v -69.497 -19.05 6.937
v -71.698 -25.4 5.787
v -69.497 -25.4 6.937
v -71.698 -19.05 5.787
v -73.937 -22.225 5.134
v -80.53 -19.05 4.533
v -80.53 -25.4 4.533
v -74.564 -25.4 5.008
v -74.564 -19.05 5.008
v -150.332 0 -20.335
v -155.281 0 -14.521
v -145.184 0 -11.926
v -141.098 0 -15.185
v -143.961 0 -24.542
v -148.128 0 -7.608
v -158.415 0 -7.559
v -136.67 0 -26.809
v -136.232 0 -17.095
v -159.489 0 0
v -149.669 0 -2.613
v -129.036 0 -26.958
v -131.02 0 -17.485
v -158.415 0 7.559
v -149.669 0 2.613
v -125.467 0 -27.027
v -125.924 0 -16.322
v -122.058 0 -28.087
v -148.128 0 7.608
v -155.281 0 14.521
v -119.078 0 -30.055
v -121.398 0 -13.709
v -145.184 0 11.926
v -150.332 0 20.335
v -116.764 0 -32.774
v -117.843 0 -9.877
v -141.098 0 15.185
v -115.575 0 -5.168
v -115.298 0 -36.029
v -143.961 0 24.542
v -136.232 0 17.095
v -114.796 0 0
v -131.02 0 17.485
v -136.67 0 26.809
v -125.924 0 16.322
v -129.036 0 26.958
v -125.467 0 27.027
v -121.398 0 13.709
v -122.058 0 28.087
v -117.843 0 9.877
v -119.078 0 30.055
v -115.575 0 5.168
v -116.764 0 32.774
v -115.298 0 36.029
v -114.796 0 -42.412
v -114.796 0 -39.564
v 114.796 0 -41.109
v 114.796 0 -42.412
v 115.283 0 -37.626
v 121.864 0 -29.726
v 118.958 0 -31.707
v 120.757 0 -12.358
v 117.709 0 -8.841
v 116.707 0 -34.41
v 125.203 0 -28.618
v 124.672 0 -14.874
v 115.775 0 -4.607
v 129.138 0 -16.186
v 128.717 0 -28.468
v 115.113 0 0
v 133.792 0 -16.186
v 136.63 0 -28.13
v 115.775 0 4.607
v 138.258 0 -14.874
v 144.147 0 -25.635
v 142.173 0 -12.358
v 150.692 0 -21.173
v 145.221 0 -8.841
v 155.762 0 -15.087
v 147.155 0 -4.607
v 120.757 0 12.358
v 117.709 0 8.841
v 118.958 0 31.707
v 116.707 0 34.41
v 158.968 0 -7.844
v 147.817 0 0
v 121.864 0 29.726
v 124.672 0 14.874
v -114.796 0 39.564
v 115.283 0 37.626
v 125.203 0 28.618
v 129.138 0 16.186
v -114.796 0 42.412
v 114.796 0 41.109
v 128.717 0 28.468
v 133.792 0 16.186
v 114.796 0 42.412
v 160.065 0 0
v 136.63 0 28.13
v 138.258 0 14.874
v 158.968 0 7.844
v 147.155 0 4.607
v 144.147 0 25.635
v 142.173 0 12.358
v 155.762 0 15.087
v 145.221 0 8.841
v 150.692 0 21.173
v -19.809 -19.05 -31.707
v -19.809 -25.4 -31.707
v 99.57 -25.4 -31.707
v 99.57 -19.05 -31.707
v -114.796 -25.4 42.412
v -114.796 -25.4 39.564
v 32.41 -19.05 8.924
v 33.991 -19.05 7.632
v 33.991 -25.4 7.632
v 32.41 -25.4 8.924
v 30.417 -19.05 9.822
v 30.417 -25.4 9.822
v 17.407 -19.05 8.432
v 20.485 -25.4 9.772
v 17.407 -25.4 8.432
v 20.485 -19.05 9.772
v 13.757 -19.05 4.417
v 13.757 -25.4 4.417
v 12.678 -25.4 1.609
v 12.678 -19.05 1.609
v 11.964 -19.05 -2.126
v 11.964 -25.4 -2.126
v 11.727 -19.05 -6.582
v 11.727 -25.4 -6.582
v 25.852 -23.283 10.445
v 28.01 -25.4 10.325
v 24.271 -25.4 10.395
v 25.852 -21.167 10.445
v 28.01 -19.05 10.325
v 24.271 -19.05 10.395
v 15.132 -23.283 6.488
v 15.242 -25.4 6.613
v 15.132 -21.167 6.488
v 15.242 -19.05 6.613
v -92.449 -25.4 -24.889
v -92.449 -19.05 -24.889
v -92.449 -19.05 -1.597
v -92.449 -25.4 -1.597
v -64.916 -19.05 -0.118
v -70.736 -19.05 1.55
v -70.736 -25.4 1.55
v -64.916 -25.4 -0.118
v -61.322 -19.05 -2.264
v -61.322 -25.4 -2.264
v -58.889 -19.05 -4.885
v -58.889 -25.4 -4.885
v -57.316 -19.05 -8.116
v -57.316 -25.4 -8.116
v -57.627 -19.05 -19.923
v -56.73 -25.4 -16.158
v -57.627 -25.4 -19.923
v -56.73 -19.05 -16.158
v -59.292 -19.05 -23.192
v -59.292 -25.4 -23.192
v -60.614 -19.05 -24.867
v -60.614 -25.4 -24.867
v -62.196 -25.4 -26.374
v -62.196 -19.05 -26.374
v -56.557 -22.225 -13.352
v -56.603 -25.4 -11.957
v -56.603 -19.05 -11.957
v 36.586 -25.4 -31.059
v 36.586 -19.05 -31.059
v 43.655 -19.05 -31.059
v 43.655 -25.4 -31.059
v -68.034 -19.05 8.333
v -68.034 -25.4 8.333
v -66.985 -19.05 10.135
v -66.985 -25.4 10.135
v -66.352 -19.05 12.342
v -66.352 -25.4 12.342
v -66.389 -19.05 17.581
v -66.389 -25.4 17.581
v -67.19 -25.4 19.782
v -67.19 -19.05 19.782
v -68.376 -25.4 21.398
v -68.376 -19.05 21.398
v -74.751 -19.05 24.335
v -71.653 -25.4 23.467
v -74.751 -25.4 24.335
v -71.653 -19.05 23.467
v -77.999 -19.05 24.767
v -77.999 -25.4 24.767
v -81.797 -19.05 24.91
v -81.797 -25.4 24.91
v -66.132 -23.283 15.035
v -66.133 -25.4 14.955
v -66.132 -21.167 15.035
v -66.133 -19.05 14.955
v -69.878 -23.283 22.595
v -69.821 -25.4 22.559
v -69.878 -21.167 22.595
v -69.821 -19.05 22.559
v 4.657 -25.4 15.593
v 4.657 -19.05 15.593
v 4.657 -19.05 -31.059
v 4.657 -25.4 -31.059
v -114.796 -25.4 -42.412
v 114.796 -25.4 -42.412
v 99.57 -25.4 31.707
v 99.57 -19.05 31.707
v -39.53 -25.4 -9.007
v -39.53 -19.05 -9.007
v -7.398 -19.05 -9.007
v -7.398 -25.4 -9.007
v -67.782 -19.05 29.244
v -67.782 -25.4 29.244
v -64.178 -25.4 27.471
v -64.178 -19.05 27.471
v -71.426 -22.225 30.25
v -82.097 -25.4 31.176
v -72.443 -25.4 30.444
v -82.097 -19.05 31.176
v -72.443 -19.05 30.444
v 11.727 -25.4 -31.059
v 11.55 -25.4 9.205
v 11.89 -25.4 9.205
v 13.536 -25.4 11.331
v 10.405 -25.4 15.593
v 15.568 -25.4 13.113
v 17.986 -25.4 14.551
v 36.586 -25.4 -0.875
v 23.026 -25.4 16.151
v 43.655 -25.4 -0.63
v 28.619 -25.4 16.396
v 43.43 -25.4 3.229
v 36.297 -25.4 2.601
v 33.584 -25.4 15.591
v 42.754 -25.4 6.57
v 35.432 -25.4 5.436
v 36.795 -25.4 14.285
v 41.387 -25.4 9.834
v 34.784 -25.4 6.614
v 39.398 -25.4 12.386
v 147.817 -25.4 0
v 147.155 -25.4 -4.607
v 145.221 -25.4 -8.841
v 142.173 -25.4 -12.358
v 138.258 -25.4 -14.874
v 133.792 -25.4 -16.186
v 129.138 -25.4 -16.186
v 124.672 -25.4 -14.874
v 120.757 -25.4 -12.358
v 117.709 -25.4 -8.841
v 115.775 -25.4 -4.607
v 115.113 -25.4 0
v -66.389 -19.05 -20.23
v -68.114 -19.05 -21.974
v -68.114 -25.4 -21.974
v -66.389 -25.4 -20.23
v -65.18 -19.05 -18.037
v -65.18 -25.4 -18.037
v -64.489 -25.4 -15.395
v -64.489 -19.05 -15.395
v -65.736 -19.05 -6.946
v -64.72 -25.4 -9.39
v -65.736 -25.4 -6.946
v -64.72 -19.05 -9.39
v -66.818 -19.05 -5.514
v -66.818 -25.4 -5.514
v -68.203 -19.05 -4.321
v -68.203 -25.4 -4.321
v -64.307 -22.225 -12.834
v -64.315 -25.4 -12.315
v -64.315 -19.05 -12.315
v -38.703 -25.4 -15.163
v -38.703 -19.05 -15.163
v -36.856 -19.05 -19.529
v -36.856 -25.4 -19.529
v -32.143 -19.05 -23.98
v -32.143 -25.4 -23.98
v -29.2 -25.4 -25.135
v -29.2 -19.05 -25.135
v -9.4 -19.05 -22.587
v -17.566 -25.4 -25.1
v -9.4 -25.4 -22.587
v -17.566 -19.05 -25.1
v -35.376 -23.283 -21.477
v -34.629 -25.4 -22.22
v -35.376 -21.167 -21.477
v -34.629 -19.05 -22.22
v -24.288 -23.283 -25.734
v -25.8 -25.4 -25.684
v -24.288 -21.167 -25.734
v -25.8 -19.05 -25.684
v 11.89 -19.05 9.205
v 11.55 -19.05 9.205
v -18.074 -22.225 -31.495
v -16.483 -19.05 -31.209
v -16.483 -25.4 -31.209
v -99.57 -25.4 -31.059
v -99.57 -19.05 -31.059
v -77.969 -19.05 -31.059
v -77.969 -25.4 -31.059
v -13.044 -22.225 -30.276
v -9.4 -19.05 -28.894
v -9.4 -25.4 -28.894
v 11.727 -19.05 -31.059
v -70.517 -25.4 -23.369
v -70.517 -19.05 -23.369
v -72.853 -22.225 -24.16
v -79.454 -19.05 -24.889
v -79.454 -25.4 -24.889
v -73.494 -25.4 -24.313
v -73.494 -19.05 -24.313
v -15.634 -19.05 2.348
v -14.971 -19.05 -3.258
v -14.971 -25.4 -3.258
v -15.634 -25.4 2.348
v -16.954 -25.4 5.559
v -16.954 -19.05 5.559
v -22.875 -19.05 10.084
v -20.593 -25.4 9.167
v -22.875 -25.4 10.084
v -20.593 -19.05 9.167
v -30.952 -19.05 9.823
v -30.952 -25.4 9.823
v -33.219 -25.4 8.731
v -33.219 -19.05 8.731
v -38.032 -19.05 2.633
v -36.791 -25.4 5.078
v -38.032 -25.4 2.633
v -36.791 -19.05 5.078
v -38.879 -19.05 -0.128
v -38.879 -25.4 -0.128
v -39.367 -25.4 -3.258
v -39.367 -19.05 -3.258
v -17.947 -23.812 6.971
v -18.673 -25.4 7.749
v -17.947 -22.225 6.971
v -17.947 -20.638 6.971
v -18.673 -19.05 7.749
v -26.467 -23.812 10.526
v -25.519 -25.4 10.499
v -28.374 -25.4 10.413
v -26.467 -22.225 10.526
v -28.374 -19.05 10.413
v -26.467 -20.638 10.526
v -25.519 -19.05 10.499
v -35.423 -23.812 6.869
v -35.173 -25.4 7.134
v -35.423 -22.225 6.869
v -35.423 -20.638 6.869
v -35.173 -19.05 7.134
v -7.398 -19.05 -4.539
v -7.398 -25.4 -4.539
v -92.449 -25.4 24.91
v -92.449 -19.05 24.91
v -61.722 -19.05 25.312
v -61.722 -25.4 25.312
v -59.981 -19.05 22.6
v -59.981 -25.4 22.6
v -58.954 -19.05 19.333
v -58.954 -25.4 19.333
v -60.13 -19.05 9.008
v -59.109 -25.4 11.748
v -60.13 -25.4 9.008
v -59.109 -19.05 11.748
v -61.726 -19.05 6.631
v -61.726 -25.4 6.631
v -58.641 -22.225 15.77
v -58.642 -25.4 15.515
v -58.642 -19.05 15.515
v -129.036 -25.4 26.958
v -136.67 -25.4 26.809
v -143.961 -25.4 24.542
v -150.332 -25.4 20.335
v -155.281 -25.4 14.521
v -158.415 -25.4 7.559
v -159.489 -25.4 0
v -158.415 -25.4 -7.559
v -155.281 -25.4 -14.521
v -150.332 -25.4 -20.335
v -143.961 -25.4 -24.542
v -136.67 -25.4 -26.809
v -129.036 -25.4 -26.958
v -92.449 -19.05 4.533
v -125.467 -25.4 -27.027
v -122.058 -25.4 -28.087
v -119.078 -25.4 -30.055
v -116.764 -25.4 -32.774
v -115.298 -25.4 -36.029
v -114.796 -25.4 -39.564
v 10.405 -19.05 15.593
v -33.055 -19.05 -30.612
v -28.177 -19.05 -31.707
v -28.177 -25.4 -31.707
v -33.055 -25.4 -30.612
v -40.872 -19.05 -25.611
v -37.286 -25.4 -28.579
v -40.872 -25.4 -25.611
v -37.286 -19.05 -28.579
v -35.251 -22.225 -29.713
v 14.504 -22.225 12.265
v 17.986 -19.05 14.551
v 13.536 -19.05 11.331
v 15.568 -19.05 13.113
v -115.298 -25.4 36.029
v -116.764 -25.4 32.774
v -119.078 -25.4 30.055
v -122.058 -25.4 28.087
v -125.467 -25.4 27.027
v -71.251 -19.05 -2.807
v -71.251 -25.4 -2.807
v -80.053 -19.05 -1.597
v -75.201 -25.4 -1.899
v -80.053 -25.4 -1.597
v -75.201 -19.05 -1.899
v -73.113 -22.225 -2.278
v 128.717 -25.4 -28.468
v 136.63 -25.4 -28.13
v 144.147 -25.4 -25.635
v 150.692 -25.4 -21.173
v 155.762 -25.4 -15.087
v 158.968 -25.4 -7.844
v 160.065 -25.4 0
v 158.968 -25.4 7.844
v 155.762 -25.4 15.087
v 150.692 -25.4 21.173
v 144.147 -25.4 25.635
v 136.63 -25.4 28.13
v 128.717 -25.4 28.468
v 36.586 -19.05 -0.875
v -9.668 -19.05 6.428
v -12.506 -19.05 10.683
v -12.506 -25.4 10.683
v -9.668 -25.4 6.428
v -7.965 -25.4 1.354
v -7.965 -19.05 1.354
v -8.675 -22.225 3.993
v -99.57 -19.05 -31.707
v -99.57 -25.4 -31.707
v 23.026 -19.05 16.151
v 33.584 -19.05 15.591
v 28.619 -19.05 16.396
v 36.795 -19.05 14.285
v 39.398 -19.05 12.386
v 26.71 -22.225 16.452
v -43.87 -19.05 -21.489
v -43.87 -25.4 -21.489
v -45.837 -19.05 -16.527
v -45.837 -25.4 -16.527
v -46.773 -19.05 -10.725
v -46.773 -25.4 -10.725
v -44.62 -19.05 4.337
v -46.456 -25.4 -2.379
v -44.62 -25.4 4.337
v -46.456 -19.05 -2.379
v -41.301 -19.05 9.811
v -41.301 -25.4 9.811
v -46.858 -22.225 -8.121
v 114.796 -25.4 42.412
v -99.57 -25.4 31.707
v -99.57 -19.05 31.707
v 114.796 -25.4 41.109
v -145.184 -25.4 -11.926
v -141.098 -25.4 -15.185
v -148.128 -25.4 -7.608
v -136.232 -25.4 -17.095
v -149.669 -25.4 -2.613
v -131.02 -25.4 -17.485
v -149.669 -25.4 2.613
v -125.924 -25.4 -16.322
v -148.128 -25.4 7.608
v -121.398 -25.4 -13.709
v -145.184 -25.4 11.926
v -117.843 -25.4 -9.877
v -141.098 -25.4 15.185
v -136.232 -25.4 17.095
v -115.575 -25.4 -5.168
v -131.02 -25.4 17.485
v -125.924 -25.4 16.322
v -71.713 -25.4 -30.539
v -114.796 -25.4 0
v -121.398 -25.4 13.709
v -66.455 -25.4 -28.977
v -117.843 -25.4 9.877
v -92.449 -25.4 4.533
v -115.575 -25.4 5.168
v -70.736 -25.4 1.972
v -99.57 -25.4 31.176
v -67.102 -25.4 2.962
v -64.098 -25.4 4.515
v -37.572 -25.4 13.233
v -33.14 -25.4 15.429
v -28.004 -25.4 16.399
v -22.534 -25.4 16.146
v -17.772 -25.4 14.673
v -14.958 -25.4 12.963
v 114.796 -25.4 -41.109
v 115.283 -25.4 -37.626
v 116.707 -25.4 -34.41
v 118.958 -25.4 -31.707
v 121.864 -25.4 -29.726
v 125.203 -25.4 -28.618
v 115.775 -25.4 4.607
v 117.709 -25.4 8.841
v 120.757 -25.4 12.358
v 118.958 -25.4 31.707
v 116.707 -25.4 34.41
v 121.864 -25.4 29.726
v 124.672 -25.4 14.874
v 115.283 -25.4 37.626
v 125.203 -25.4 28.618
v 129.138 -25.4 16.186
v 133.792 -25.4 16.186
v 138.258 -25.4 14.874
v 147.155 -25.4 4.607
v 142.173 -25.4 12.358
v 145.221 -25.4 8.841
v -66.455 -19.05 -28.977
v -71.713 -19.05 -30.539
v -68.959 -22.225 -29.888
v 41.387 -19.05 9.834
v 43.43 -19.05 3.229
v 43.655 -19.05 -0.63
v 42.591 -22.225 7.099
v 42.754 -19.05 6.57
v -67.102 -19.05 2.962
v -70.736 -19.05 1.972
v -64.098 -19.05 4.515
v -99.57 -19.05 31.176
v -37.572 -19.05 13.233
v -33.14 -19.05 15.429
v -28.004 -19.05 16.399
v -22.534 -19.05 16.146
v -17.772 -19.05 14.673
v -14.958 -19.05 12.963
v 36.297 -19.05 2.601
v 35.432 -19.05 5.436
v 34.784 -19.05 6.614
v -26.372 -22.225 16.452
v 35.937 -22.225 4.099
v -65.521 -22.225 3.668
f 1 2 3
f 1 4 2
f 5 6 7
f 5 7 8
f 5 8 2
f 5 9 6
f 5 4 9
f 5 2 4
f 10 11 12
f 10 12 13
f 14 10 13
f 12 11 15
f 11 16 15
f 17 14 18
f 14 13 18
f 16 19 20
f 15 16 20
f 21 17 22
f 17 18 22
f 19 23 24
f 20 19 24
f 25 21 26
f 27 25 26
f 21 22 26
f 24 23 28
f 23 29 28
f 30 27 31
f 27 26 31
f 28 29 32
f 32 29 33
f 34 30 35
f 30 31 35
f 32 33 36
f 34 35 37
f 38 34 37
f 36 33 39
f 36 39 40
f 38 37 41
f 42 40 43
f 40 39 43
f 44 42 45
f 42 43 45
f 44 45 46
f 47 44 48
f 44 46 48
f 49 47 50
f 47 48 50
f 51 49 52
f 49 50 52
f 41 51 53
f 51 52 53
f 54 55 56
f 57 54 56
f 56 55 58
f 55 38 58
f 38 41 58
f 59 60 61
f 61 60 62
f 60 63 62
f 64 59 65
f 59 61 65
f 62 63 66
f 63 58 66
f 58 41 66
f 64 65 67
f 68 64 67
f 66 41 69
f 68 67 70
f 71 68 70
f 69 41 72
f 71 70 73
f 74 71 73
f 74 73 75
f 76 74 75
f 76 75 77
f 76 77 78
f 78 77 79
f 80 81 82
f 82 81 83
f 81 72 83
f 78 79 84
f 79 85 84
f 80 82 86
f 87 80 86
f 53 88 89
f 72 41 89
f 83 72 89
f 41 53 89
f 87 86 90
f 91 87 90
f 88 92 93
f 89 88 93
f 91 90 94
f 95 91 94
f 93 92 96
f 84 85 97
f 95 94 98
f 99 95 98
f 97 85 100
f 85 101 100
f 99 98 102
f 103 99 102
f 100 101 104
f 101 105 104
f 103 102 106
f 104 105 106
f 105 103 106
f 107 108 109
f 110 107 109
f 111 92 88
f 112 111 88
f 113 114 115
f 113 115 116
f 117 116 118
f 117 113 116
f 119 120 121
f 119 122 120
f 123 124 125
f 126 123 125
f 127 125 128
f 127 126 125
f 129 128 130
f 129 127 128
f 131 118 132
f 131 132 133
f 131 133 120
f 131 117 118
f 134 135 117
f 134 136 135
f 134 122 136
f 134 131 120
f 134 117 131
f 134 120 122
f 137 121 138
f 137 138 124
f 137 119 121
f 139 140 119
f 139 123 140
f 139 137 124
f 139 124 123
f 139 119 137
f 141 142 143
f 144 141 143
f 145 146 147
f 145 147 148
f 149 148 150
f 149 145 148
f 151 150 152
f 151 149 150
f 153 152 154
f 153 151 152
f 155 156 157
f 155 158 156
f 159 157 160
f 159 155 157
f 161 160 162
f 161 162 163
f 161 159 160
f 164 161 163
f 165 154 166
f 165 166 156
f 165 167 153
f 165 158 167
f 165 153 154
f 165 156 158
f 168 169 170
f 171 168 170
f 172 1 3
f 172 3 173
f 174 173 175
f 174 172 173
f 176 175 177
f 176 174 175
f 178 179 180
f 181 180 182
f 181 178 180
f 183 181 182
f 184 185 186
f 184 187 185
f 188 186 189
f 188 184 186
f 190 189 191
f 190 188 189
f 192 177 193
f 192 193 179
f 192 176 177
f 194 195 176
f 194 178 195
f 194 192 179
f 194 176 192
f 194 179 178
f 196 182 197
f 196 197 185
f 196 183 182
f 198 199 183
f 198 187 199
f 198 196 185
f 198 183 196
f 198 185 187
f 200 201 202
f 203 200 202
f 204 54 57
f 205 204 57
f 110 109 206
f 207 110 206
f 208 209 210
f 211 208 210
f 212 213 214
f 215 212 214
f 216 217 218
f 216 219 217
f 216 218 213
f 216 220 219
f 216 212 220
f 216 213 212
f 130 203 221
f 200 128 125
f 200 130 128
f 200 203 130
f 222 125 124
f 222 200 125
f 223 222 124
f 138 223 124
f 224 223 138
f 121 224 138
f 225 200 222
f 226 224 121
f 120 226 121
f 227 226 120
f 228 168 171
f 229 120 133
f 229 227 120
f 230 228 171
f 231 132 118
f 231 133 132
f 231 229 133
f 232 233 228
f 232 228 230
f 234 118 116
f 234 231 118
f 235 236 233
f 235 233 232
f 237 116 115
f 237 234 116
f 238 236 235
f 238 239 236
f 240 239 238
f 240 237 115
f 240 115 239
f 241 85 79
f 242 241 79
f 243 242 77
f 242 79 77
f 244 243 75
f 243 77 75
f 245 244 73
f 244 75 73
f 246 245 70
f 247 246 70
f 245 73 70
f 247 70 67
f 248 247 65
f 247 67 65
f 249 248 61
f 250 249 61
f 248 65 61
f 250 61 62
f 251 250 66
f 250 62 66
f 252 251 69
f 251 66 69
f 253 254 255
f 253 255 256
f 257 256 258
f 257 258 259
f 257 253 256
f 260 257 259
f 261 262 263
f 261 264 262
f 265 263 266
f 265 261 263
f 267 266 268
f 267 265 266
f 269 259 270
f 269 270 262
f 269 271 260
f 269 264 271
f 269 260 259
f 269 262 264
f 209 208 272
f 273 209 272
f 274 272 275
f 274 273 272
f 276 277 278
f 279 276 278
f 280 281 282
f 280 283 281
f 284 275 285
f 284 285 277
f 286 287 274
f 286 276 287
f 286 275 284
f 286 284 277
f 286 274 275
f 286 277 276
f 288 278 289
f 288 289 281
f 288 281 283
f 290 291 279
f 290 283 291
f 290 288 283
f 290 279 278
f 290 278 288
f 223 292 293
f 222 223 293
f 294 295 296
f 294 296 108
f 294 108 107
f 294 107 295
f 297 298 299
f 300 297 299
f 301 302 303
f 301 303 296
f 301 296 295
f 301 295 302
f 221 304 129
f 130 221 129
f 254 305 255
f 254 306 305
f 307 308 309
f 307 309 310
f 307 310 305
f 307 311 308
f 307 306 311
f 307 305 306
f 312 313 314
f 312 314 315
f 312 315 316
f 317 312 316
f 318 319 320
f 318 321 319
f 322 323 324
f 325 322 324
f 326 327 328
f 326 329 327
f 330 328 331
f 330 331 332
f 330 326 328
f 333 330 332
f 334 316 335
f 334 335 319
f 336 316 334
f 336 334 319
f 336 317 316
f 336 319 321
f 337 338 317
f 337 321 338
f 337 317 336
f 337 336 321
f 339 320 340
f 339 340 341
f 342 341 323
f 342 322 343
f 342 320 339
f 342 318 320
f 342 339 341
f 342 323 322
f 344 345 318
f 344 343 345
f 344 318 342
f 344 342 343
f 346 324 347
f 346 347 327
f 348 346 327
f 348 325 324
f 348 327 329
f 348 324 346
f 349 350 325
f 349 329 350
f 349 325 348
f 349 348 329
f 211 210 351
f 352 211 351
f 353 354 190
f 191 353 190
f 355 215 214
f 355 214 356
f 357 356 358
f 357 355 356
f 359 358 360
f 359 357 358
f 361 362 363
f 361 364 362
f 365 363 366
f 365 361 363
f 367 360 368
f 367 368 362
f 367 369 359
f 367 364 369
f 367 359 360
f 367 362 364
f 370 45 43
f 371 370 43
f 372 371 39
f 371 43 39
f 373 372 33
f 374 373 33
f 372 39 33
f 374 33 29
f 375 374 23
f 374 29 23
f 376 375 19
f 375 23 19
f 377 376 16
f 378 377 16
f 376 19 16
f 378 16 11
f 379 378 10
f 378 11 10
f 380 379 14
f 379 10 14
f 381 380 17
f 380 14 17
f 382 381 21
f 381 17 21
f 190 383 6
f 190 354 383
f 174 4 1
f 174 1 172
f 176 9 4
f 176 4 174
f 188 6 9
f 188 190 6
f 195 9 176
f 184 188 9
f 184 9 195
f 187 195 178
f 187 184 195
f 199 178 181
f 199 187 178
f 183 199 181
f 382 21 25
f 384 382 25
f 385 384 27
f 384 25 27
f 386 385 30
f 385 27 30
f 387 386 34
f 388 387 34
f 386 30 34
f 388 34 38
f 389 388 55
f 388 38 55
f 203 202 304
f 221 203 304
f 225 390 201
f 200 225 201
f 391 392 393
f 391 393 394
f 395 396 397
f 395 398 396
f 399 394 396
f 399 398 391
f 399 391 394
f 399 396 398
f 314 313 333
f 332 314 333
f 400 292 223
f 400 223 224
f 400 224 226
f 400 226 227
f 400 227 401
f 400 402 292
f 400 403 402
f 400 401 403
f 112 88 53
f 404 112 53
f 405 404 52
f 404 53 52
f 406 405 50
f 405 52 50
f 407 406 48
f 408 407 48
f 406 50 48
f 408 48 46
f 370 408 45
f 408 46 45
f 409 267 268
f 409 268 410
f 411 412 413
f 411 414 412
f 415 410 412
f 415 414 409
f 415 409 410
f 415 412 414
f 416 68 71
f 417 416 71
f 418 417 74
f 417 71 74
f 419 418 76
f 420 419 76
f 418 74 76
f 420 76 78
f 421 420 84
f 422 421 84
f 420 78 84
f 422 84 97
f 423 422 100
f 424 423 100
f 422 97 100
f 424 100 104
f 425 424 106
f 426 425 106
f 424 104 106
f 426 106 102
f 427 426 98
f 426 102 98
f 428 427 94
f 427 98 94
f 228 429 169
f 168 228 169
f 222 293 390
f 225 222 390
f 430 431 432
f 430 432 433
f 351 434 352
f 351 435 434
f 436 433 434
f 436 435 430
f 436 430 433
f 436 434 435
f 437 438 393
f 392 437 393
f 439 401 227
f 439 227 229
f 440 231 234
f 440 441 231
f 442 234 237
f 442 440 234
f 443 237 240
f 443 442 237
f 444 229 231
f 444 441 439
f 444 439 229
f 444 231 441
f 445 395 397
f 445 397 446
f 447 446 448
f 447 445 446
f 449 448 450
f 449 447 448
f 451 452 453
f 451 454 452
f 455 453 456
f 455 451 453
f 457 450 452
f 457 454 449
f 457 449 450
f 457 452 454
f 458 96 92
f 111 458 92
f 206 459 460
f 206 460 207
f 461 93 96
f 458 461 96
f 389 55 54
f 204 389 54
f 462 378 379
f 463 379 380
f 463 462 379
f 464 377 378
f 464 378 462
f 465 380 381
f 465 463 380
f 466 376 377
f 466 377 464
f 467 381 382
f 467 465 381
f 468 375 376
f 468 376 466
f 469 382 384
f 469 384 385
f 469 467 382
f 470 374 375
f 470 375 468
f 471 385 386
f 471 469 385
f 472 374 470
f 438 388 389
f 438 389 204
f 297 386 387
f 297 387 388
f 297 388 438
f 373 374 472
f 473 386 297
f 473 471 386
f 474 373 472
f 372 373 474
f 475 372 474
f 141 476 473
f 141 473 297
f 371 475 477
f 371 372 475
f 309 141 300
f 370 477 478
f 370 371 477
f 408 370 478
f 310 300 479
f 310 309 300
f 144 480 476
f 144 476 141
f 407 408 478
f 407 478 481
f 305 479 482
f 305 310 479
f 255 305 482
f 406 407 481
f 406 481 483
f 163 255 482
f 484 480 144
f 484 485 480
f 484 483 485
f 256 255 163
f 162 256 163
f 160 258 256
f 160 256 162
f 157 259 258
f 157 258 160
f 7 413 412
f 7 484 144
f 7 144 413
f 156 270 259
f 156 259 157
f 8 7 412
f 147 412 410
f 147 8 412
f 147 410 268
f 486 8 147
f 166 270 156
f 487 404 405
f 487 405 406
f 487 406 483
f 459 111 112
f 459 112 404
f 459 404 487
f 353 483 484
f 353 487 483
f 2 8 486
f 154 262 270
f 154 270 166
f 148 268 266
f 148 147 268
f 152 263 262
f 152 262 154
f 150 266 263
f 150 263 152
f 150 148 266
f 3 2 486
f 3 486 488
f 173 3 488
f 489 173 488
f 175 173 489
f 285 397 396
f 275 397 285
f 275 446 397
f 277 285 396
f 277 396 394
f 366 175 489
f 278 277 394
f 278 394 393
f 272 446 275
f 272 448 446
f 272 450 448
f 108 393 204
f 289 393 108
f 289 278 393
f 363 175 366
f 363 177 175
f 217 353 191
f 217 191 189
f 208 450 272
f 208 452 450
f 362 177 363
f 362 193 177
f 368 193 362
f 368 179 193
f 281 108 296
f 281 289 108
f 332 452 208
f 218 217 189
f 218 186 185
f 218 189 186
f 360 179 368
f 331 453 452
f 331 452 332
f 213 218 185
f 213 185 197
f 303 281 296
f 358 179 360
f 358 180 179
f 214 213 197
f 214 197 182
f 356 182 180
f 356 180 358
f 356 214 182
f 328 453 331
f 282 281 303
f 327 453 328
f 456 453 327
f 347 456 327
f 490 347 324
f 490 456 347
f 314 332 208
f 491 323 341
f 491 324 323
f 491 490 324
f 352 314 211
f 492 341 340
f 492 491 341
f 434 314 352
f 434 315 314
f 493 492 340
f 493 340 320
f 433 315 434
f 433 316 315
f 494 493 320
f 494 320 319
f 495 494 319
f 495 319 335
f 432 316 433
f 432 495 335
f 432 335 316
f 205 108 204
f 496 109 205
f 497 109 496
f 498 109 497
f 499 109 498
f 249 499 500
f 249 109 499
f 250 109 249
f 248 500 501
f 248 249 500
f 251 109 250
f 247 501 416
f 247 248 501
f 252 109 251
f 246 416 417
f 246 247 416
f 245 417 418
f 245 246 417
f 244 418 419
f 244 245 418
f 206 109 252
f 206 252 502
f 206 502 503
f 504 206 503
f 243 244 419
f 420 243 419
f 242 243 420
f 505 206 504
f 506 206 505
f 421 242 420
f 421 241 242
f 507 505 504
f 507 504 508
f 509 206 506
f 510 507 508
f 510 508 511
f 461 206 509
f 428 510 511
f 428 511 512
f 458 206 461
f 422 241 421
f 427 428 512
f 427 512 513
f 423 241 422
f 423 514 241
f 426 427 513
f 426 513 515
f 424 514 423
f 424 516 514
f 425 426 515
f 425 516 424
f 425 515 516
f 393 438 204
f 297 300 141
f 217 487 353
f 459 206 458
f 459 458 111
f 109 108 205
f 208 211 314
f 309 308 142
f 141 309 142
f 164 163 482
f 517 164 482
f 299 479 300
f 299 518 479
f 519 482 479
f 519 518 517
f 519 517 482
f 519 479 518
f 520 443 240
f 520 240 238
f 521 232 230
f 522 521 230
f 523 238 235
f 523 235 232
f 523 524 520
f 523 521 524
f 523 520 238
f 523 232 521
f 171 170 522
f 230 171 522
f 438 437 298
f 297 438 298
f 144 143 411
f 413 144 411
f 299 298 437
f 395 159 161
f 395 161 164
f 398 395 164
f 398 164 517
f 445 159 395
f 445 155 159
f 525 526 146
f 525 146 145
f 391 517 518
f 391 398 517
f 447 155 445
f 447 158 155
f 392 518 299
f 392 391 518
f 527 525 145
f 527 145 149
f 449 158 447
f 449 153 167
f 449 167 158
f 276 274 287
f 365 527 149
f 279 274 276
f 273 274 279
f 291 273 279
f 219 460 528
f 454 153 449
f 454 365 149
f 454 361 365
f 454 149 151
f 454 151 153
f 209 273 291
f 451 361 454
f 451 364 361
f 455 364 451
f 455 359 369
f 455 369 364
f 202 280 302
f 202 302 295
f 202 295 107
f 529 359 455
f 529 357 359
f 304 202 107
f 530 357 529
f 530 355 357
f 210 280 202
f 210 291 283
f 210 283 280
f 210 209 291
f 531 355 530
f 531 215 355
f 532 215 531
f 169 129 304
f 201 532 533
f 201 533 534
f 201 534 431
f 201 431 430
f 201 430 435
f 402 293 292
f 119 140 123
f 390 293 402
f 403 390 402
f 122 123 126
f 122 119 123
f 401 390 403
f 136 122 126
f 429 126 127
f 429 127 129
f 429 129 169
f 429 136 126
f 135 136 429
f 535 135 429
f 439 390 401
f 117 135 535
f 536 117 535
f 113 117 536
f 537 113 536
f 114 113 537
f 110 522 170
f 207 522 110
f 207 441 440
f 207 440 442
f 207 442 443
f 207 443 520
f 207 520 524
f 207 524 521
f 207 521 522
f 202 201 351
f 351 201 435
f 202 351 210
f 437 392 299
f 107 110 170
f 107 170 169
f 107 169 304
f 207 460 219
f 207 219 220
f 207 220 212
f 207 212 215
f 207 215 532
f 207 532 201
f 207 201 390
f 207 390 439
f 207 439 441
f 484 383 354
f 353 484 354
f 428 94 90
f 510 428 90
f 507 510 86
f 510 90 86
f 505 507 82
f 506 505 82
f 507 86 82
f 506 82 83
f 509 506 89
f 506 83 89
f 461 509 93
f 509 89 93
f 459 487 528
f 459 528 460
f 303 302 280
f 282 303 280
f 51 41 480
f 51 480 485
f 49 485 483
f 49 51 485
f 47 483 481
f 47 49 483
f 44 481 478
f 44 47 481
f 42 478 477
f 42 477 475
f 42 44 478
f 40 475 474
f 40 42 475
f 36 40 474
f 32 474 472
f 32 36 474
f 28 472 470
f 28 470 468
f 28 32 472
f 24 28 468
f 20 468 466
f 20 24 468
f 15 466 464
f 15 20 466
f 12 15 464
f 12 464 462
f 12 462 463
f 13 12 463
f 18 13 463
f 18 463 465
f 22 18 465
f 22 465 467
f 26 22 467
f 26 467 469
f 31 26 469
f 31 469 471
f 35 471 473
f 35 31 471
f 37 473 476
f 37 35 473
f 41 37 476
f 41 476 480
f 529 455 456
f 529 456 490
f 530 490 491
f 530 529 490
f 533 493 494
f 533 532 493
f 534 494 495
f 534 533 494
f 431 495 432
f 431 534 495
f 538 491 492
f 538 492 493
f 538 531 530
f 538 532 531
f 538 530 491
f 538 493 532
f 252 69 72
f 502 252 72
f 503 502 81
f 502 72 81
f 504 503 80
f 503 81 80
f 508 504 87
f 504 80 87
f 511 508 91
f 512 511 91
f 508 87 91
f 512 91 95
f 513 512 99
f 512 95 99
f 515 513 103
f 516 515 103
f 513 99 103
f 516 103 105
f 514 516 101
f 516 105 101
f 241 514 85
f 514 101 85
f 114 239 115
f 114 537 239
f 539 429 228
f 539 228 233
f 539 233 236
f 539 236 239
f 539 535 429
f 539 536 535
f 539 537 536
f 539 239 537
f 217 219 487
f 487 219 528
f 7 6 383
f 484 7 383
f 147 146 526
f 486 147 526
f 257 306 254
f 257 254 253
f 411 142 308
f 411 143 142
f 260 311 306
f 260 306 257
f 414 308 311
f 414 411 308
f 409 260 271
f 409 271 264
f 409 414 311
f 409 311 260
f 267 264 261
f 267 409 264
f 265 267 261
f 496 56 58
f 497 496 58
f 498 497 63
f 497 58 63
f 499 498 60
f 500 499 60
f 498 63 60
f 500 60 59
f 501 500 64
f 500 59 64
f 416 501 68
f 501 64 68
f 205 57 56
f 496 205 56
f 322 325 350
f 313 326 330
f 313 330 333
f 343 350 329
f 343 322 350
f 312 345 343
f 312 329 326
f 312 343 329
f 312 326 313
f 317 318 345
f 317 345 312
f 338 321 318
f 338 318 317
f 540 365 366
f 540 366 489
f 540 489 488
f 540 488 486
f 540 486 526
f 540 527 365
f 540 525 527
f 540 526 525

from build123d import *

# Parameters (mm, degrees)
F0_R     = 17.5342485309
F0_W     = 208.0285698175
F0_H     = 60.8816854656
F1_DEPTH = 25.4
F2_W     = 199.1405338049
F2_H     = 63.4146874705
F3_DEPTH = 6.35
F6_DEPTH = 6.35


with BuildPart() as f1:
    # F0 (on Front) → F1 (new body)
    with BuildSketch(Plane.XZ):
        with BuildLine():
            Line((114.7961392999, 41.1091820392), (114.7961392999, 42.4124971032))
            Line((114.7961392999, 42.4124971032), (-114.7961392999, 42.4124971032))
            Line((-114.7961392999, 42.4124971032), (-114.7961392999, 39.5639197406))
            ThreePointArc((-114.7961392999, 39.5639197406), (-119.0780712792, 30.0546542169), (-129.0364748589, 26.9576765903))
            ThreePointArc((-129.0364748589, 26.9576765903), (-159.4885576846, 0), (-129.0364748589, -26.9576765903))
            ThreePointArc((-129.0364748589, -26.9576765903), (-119.0780712792, -30.0546542169), (-114.7961392999, -39.5639197406))
            Line((-114.7961392999, -39.5639197406), (-114.7961392999, -42.4124971032))
            Line((-114.7961392999, -42.4124971032), (114.7961392999, -42.4124971032))
            Line((114.7961392999, -42.4124971032), (114.7961392999, -41.1091820392))
            ThreePointArc((114.7961392999, -41.1091820392), (118.9582568629, -31.7073437353), (128.7165429996, -28.4679552471))
            ThreePointArc((128.7165429996, -28.4679552471), (160.0651957896, 0), (128.7165429996, 28.4679552471))
            ThreePointArc((128.7165429996, 28.4679552471), (118.9582568629, 31.7073437353), (114.7961392999, 41.1091820392))
        make_face()
        with Locations((-132.3303878307, 0)):
            Circle(F0_R, mode=Mode.SUBTRACT)
        Rectangle(F0_W, F0_H, mode=Mode.SUBTRACT)
        with BuildLine():
            ThreePointArc((115.1127634511, 0), (131.4648836851, 16.352120234), (147.8170039192, 0))
            ThreePointArc((147.8170039192, 0), (131.4648836851, -16.352120234), (115.1127634511, 0))
        make_face(mode=Mode.SUBTRACT)
        Rectangle(F0_W, F0_H)
    extrude(amount=F1_DEPTH)

    # F2 (on face) → F3 (cut)
    with BuildSketch(Plane.XZ.offset(25.4)):
        Rectangle(F2_W, F2_H)
    extrude(amount=-F3_DEPTH, mode=Mode.SUBTRACT)

    # F4 (on face) → F6 (join)
    with BuildSketch(Plane.XZ.offset(19.05)):
        with BuildLine():
            Line((36.5855240286, -0.8747291355), (36.5855240286, -31.0594588518))
            Line((36.5855240286, -31.0594588518), (43.6549620804, -31.0594588518))
            Line((43.6549620804, -31.0594588518), (43.6549620804, -0.6295463129))
            add(Edge.make_bspline(
                [(39.3983158546, 12.3855751871), (43.6549620804, 8.3196267123), (43.6549620804, -0.6295463129)],
                knots=[0, 0, 0, 1, 1, 1], degree=2))
            add(Edge.make_bspline(
                [(26.7101047848, 16.451523662), (35.1416696288, 16.451523662), (39.3983158546, 12.3855751871)],
                knots=[0, 0, 0, 1, 1, 1], degree=2))
            add(Edge.make_bspline(
                [(17.9856826804, 14.5513567868), (21.9017972081, 16.451523662), (26.7101047848, 16.451523662)],
                knots=[0, 0, 0, 1, 1, 1], degree=2))
            add(Edge.make_bspline(
                [(11.890165285, 9.2050091272), (14.0695681526, 12.6511899116), (17.9856826804, 14.5513567868)],
                knots=[0, 0, 0, 1, 1, 1], degree=2))
            Line((11.890165285, 9.2050091272), (11.549633587, 9.2050091272))
            Line((11.549633587, 9.2050091272), (10.4054470815, 15.5933837829))
            Line((10.4054470815, 15.5933837829), (4.6572720182, 15.5933837829))
            Line((4.6572720182, 15.5933837829), (4.6572720182, -31.0594588518))
            Line((4.6572720182, -31.0594588518), (11.72671007, -31.0594588518))
            Line((11.72671007, -31.0594588518), (11.72671007, -6.582040395))
            add(Edge.make_bspline(
                [(15.1320270506, 6.4875661767), (11.72671007, 2.5305878452), (11.72671007, -6.582040395)],
                knots=[0, 0, 0, 1, 1, 1], degree=2))
            add(Edge.make_bspline(
                [(25.8519649056, 10.4445445082), (18.5373440312, 10.4445445082), (15.1320270506, 6.4875661767)],
                knots=[0, 0, 0, 1, 1, 1], degree=2))
            add(Edge.make_bspline(
                [(33.9906724894, 7.6317526822), (31.3958209501, 10.4445445082), (25.8519649056, 10.4445445082)],
                knots=[0, 0, 0, 1, 1, 1], degree=2))
            add(Edge.make_bspline(
                [(36.5855240286, -0.8747291355), (36.5855240286, 4.8189608562), (33.9906724894, 7.6317526822)],
                knots=[0, 0, 0, 1, 1, 1], degree=2))
        make_face()
        with BuildLine():
            Line((-82.0965833805, 31.1761142863), (-99.5702669024, 31.1761142863))
            Line((-99.5702669024, 31.1761142863), (-99.5702669024, -31.0594588518))
            Line((-99.5702669024, -31.0594588518), (-77.9693392, -31.0594588518))
            add(Edge.make_bspline(
                [(-62.1959109457, -26.3737426865), (-67.8351158656, -31.0594588518), (-77.9693392, -31.0594588518)],
                knots=[0, 0, 0, 1, 1, 1], degree=2))
            add(Edge.make_bspline(
                [(-56.5567060258, -13.3518105525), (-56.5567060258, -21.6880265211), (-62.1959109457, -26.3737426865)],
                knots=[0, 0, 0, 1, 1, 1], degree=2))
            add(Edge.make_bspline(
                [(-70.7364459331, 1.5498565548), (-56.5567060258, -0.8747291355), (-56.5567060258, -13.3518105525)],
                knots=[0, 0, 0, 1, 1, 1], degree=2))
            Line((-70.7364459331, 1.5498565548), (-70.7364459331, 1.9721158604))
            add(Edge.make_bspline(
                [(-61.7259772024, 6.6305894899), (-64.8111943868, 3.0345747583), (-70.7364459331, 1.9721158604)],
                knots=[0, 0, 0, 1, 1, 1], degree=2))
            add(Edge.make_bspline(
                [(-58.6407600179, 15.7704602659), (-58.6407600179, 10.2266042214), (-61.7259772024, 6.6305894899)],
                knots=[0, 0, 0, 1, 1, 1], degree=2))
            add(Edge.make_bspline(
                [(-64.1778054284, 27.4711294114), (-58.6407600179, 23.7661445364), (-58.6407600179, 15.7704602659)],
                knots=[0, 0, 0, 1, 1, 1], degree=2))
            add(Edge.make_bspline(
                [(-82.0965833805, 31.1761142863), (-69.7148508389, 31.1761142863), (-64.1778054284, 27.4711294114)],
                knots=[0, 0, 0, 1, 1, 1], degree=2))
        make_face()
        with BuildLine():
            Line((-92.4487470017, -24.8890244829), (-92.4487470017, -1.5966563354))
            Line((-92.4487470017, -1.5966563354), (-80.0533931921, -1.5966563354))
            add(Edge.make_bspline(
                [(-68.2028900995, -4.3209099199), (-72.0985727254, -1.5966563354), (-80.0533931921, -1.5966563354)],
                knots=[0, 0, 0, 1, 1, 1], degree=2))
            add(Edge.make_bspline(
                [(-64.3072074737, -12.8342023714), (-64.3072074737, -7.0451635044), (-68.2028900995, -4.3209099199)],
                knots=[0, 0, 0, 1, 1, 1], degree=2))
            add(Edge.make_bspline(
                [(-68.114351858, -21.9740731475), (-64.3072074737, -19.0591218121), (-64.3072074737, -12.8342023714)],
                knots=[0, 0, 0, 1, 1, 1], degree=2))
            add(Edge.make_bspline(
                [(-79.4540574036, -24.8890244829), (-71.9214962424, -24.8890244829), (-68.114351858, -21.9740731475)],
                knots=[0, 0, 0, 1, 1, 1], degree=2))
            Line((-79.4540574036, -24.8890244829), (-92.4487470017, -24.8890244829))
        make_face(mode=Mode.SUBTRACT)
        with BuildLine():
            Line((-80.5301375694, 4.5329142298), (-92.4487470017, 4.5329142298))
            Line((-92.4487470017, 4.5329142298), (-92.4487470017, 24.9103310419))
            Line((-92.4487470017, 24.9103310419), (-81.7969154862, 24.9103310419))
            add(Edge.make_bspline(
                [(-69.878306054, 22.5947154951), (-73.6241547327, 24.9103310419), (-81.7969154862, 24.9103310419)],
                knots=[0, 0, 0, 1, 1, 1], degree=2))
            add(Edge.make_bspline(
                [(-66.1324573753, 15.0349117981), (-66.1324573753, 20.2790999483), (-69.878306054, 22.5947154951)],
                knots=[0, 0, 0, 1, 1, 1], degree=2))
            add(Edge.make_bspline(
                [(-69.4969105522, 6.9370680181), (-66.1324573753, 9.3412218065), (-66.1324573753, 15.0349117981)],
                knots=[0, 0, 0, 1, 1, 1], degree=2))
            add(Edge.make_bspline(
                [(-80.5301375694, 4.5329142298), (-72.861363729, 4.5329142298), (-69.4969105522, 6.9370680181)],
                knots=[0, 0, 0, 1, 1, 1], degree=2))
        make_face(mode=Mode.SUBTRACT)
        with BuildLine():
            add(Edge.make_bspline(
                [(-28.1770388712, -31.7073437353), (-35.9783446463, -30.7660762397), (-40.8718160129, -25.6109516828)],
                knots=[0.1825887008, 0.1825887008, 0.1825887008, 1, 1, 1], degree=2))
            Line((-28.1770388712, -31.7073437353), (-19.8087642709, -31.7073437353))
            add(Edge.make_bspline(
                [(-16.4829357976, -31.209292799), (-18.0019268098, -31.5316908913), (-19.8087642709, -31.7073437353)],
                knots=[0, 0, 0, 0.4551678559, 0.4551678559, 0.4551678559], degree=2))
            add(Edge.make_bspline(
                [(-9.3998764779, -28.8936772521), (-13.1457251566, -30.500986867), (-16.4829357976, -31.209292799)],
                knots=[0, 0, 0, 1, 1, 1], degree=2))
            Line((-9.3998764779, -28.8936772521), (-9.3998764779, -22.587030204))
            add(Edge.make_bspline(
                [(-24.2879223172, -25.7335430941), (-16.7553611561, -25.7335430941), (-9.3998764779, -22.587030204)],
                knots=[0, 0, 0, 1, 1, 1], degree=2))
            add(Edge.make_bspline(
                [(-35.3756344062, -21.4768968683), (-31.4390879766, -25.7335430941), (-24.2879223172, -25.7335430941)],
                knots=[0, 0, 0, 1, 1, 1], degree=2))
            add(Edge.make_bspline(
                [(-39.5301211226, -9.0066260852), (-39.3121808358, -17.2202506425), (-35.3756344062, -21.4768968683)],
                knots=[0, 0, 0, 1, 1, 1], degree=2))
            Line((-39.5301211226, -9.0066260852), (-7.3975500933, -9.0066260852))
            Line((-7.3975500933, -9.0066260852), (-7.3975500933, -4.5388502066))
            add(Edge.make_bspline(
                [(-12.5055255642, 10.6829166968), (-7.3975500933, 4.9143097316), (-7.3975500933, -4.5388502066)],
                knots=[0, 0, 0, 1, 1, 1], degree=2))
            add(Edge.make_bspline(
                [(-26.3719763094, 16.451523662), (-17.6135010352, 16.451523662), (-12.5055255642, 10.6829166968)],
                knots=[0, 0, 0, 1, 1, 1], degree=2))
            add(Edge.make_bspline(
                [(-41.3008859525, 9.8111555498), (-35.7434086401, 16.451523662), (-26.3719763094, 16.451523662)],
                knots=[0, 0, 0, 1, 1, 1], degree=2))
            add(Edge.make_bspline(
                [(-46.8583632649, -8.1212436702), (-46.8583632649, 3.1707874375), (-41.3008859525, 9.8111555498)],
                knots=[0, 0, 0, 1, 1, 1], degree=2))
            add(Edge.make_bspline(
                [(-40.8718160129, -25.6109516828), (-46.8583632649, -19.3043046347), (-46.8583632649, -8.1212436702)],
                knots=[0, 0, 0, 1, 1, 1], degree=2))
        make_face()
        with BuildLine():
            add(Edge.make_bspline(
                [(-26.4673251849, 10.5262721157), (-32.0792875689, 10.5262721157), (-35.4233088439, 6.8689616785)],
                knots=[0, 0, 0, 1, 1, 1], degree=2))
            add(Edge.make_bspline(
                [(-17.9472220993, 6.9711211879), (-20.9234691404, 10.5262721157), (-26.4673251849, 10.5262721157)],
                knots=[0, 0, 0, 1, 1, 1], degree=2))
            add(Edge.make_bspline(
                [(-14.9709750582, -3.2584510219), (-14.9709750582, 3.4159702601), (-17.9472220993, 6.9711211879)],
                knots=[0, 0, 0, 1, 1, 1], degree=2))
            Line((-14.9709750582, -3.2584510219), (-39.3666659075, -3.2584510219))
            add(Edge.make_bspline(
                [(-35.4233088439, 6.8689616785), (-38.7673301189, 3.2116512413), (-39.3666659075, -3.2584510219)],
                knots=[0, 0, 0, 1, 1, 1], degree=2))
        make_face(mode=Mode.SUBTRACT)
    extrude(amount=F6_DEPTH)


solid = f1.part
